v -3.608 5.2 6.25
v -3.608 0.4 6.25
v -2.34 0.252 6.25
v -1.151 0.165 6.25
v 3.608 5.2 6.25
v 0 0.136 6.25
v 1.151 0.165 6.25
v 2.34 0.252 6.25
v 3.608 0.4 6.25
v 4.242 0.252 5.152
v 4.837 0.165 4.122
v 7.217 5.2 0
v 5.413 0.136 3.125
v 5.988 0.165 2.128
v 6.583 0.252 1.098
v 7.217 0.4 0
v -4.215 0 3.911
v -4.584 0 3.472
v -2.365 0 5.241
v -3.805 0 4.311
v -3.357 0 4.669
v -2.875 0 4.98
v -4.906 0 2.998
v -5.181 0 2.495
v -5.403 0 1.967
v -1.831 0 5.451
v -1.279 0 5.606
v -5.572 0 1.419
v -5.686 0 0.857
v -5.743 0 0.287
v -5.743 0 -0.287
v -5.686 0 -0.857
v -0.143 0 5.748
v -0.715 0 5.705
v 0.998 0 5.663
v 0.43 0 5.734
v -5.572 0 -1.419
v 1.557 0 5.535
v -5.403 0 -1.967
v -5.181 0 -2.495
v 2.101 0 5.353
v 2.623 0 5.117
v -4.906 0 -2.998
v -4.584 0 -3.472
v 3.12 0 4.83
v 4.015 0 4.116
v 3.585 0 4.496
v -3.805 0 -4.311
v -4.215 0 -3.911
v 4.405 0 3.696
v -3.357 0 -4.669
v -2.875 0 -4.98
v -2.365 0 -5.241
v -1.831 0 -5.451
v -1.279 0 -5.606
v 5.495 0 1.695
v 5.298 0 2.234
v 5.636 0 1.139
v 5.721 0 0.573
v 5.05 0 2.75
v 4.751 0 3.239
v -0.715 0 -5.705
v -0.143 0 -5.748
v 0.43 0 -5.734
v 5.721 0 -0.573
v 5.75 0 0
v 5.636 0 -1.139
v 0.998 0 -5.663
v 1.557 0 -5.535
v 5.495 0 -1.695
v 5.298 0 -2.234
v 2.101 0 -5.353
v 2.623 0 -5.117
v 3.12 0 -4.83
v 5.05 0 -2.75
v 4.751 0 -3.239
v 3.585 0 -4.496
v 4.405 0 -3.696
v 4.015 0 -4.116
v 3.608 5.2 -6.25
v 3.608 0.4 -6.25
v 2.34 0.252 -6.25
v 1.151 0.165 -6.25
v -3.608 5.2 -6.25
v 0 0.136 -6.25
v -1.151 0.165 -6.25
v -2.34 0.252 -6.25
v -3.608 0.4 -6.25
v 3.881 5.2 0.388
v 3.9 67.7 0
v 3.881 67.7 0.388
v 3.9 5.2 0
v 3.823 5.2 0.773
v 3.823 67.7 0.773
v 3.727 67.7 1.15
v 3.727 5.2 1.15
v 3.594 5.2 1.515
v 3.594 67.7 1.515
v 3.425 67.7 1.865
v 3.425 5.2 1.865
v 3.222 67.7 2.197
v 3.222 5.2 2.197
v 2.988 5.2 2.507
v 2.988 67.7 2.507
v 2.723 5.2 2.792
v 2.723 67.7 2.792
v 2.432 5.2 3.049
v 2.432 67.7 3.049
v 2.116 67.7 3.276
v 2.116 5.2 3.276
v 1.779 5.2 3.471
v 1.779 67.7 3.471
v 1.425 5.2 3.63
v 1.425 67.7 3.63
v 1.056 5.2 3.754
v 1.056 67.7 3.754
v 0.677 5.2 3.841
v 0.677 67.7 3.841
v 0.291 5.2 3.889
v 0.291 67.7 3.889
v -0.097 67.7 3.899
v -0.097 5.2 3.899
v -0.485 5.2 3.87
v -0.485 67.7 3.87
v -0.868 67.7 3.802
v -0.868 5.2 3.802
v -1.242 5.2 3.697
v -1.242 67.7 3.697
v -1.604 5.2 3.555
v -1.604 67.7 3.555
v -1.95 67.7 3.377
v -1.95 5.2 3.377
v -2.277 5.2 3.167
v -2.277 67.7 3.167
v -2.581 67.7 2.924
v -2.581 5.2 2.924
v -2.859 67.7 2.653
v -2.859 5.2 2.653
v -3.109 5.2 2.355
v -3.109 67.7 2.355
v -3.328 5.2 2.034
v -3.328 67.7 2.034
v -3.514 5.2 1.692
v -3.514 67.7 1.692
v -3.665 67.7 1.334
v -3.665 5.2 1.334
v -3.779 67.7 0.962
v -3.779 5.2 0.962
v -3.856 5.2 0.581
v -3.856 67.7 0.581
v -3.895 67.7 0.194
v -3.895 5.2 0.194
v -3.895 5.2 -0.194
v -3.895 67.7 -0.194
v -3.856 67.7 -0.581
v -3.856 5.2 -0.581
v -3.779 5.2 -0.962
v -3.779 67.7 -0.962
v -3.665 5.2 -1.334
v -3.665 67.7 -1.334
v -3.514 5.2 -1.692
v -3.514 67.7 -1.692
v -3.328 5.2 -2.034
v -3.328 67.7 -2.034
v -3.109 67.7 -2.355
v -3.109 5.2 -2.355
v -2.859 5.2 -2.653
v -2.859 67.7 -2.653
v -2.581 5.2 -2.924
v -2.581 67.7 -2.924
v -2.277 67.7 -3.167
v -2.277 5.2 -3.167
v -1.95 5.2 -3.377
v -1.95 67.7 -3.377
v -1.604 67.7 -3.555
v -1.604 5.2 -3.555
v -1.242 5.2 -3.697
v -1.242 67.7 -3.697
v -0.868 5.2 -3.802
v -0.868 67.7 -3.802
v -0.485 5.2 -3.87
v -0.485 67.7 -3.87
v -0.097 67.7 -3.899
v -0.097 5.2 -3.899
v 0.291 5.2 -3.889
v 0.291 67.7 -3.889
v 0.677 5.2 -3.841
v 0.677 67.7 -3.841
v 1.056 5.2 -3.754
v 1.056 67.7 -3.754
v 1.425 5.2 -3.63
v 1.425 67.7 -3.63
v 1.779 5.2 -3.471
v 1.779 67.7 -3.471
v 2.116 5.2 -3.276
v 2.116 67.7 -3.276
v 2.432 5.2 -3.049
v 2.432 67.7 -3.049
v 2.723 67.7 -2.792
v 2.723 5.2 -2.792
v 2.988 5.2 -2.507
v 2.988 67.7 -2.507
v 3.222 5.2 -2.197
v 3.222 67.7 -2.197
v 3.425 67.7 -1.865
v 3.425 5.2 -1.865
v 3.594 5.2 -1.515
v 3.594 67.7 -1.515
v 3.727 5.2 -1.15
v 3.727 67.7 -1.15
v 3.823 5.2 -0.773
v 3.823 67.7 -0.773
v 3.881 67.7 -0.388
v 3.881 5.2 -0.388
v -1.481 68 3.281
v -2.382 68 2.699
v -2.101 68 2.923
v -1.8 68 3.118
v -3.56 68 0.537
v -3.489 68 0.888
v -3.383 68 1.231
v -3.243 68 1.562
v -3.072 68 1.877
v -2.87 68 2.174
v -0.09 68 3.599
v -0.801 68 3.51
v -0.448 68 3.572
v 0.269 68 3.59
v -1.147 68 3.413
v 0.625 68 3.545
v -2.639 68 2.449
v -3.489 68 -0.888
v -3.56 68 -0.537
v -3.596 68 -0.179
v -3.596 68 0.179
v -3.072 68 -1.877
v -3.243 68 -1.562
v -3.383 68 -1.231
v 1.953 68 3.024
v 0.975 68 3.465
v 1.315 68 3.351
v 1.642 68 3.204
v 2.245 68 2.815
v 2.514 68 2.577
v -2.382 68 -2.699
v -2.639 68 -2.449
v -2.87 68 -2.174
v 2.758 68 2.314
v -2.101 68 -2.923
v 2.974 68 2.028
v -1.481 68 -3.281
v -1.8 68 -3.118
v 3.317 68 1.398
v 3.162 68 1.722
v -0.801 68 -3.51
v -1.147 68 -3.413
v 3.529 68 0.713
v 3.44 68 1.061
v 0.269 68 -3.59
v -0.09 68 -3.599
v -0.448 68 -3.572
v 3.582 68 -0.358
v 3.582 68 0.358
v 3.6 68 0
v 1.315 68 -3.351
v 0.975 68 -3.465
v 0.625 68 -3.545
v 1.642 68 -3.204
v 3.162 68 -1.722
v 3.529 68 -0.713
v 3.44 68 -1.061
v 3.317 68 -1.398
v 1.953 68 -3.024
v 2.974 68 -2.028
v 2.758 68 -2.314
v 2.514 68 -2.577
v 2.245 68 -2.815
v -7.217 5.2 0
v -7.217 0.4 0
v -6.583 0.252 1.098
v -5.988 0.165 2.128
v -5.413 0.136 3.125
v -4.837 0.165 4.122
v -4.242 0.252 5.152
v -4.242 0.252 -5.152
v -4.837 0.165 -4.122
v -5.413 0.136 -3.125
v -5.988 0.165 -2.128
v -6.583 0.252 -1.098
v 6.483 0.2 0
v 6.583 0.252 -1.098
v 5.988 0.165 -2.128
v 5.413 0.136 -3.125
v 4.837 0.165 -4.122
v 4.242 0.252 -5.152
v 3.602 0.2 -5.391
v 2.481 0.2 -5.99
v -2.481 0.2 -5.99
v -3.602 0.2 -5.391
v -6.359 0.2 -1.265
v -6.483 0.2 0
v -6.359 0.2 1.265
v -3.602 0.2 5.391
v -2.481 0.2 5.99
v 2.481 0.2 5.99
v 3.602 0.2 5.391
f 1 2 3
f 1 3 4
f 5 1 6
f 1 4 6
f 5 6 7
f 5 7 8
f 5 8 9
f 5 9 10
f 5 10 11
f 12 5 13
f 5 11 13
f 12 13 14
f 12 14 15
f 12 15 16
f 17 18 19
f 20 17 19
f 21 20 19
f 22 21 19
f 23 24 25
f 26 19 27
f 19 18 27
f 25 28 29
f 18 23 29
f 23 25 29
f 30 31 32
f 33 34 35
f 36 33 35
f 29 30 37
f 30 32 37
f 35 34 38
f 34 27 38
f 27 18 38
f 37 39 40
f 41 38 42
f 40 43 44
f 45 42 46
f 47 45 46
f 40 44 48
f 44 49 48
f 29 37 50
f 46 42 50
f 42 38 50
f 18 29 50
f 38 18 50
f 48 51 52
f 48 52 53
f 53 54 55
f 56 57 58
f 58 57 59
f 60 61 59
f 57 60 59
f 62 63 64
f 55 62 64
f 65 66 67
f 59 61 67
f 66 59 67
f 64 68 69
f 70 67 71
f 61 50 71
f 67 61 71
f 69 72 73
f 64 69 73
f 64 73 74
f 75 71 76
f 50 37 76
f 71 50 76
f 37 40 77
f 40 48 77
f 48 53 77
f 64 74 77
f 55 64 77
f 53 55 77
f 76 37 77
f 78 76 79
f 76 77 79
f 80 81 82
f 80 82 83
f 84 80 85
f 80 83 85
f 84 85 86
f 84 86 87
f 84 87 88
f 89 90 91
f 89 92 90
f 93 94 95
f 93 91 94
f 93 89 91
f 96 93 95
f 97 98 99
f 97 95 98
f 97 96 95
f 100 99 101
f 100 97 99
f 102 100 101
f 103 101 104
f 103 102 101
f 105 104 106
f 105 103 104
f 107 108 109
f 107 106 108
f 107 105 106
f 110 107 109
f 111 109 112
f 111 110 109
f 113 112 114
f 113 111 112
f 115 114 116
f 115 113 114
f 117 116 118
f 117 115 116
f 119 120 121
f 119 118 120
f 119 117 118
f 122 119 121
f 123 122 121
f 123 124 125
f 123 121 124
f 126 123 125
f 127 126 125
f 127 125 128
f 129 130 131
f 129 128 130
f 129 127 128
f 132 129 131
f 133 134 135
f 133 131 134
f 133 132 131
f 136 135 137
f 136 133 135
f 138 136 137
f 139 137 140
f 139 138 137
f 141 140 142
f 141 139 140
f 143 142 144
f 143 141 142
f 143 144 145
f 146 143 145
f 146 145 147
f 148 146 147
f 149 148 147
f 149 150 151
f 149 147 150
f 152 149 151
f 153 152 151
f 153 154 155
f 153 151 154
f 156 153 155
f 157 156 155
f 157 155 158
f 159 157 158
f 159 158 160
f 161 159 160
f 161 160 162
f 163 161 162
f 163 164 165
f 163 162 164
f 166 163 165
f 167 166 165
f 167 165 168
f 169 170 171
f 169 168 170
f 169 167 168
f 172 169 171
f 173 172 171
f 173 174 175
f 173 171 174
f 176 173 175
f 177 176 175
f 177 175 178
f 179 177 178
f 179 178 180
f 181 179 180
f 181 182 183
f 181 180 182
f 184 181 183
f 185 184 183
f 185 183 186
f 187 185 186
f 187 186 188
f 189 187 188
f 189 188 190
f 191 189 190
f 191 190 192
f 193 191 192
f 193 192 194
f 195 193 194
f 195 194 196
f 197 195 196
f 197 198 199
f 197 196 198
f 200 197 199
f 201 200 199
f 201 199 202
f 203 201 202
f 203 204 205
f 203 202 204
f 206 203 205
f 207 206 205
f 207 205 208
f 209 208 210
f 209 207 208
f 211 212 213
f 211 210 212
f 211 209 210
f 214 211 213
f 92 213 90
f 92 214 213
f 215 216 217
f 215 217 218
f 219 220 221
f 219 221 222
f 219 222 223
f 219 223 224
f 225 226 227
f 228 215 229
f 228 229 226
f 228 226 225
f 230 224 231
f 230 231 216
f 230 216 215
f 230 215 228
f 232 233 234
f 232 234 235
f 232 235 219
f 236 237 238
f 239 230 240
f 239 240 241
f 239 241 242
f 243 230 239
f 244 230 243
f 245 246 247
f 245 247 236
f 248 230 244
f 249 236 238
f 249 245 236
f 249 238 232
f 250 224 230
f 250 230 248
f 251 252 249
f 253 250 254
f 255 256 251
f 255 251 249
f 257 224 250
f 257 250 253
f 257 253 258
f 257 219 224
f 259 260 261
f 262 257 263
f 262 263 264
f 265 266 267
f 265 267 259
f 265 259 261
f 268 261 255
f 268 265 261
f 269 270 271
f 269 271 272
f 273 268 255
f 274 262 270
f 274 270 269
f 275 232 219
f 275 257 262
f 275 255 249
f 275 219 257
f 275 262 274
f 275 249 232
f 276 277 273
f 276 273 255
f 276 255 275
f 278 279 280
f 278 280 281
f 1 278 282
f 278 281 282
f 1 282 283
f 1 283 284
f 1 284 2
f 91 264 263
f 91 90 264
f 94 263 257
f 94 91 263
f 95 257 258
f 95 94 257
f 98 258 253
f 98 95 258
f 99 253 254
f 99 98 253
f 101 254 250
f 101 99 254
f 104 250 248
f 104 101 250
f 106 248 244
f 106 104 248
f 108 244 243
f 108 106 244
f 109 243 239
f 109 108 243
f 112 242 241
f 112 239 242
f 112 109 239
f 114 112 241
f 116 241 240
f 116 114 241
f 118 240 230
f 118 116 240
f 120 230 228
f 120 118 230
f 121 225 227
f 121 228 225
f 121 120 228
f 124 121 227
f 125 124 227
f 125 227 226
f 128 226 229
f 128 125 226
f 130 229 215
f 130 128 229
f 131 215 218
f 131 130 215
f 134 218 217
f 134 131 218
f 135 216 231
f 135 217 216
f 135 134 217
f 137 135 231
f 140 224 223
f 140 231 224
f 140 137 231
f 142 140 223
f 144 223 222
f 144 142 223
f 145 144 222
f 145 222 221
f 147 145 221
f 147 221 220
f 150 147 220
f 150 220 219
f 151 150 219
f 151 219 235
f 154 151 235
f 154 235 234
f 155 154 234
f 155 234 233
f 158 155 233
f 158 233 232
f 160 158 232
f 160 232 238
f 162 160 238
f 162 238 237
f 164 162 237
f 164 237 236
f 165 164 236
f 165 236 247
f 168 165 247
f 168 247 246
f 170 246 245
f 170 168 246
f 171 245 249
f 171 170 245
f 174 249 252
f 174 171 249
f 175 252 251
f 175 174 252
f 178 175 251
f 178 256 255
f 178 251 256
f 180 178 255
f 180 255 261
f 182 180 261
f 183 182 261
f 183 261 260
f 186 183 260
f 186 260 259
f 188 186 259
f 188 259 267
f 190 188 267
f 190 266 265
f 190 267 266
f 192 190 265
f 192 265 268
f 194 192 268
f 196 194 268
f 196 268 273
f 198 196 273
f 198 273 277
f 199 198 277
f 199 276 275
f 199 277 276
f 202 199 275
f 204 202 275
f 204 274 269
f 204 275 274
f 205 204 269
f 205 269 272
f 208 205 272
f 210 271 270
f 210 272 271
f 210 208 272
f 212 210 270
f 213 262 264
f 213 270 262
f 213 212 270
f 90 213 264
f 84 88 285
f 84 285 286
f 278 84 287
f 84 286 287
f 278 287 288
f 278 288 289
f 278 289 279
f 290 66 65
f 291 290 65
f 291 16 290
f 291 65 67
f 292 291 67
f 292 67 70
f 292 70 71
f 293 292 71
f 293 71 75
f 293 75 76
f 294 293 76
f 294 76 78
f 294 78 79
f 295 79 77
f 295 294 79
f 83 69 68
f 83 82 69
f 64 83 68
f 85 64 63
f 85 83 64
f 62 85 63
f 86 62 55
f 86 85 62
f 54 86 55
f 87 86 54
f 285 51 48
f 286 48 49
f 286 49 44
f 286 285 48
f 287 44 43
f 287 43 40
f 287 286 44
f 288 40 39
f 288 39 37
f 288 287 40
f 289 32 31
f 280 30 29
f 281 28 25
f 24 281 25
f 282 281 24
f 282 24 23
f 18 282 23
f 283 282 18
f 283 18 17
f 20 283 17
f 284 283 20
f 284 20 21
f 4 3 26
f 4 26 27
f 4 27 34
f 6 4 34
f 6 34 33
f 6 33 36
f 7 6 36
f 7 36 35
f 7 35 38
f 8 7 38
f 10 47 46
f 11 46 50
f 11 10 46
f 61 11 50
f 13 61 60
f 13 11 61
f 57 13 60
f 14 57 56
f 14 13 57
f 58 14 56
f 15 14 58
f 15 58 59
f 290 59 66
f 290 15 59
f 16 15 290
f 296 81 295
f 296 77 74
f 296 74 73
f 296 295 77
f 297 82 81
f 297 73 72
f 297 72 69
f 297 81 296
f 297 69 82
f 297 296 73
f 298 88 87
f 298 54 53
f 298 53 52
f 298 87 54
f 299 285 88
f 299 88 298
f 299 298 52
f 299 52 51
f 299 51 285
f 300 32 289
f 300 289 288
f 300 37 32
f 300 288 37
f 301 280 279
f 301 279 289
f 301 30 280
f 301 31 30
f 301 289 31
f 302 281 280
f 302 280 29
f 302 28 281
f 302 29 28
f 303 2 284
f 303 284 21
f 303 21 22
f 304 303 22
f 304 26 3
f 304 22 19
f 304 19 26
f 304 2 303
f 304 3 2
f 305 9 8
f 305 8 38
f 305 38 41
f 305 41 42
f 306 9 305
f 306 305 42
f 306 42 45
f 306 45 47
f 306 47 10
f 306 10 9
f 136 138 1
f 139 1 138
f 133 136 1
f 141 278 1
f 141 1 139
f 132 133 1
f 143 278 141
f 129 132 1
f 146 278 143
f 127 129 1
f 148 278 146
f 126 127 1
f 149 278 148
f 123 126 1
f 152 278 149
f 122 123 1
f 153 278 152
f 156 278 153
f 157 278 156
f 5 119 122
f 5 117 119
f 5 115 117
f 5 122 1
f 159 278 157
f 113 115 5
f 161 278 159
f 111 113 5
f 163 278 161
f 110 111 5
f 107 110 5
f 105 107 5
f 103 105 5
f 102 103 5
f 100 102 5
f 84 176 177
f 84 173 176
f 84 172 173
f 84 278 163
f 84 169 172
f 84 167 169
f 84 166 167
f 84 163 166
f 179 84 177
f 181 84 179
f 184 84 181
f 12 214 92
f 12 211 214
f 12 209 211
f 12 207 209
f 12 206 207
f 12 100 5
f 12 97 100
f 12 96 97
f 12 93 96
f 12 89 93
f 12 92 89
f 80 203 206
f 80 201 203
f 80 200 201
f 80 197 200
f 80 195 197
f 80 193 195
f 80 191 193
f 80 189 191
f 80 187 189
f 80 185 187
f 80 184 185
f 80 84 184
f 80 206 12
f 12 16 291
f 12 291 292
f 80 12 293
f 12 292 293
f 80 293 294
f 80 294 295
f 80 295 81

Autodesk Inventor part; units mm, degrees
ref_plane "YZ Plane" through (0, 0, 0) normal (1, 0, 0) x (0, 1, 0)
ref_plane "XZ Plane" through (0, 0, 0) normal (0, 1, 0) x (-1, 0, 0)
ref_plane "XY Plane" through (0, 0, 0) normal (0, 0, 1) x (1, 0, 0)
sketch "Schizzo4" plane through (0, 0, 0) normal (0, 0, 1) x (1, 0, 0)
  line L0 (0, 0) -> (0, 68)
  line L1 (0, 68) -> (3.9, 68)
  line L2 (3.9, 68) -> (3.9, 5.2)
  line L3 (3.9, 5.2) -> (7.5, 5.2)
  line L4 (7.5, 5.2) -> (7.5, 0)
  line L5 (7.5, 0) -> (0, 0)
  dimension "d0" = 5.2
  dimension "d1" = 7.8
  dimension "d2" = 15
  dimension "d3" = 68
revolve "Rivoluzione1" add sketch "Schizzo4" angle 360 about axis through (0, 0, 0) along (0, 1, 0)
thread "Filettatura1" size "M8x1.25" class "6g" standard "ANSI Metric M Profile" length 62.5 offset 37
sketch "Schizzo5" plane through (0, 0, 0) normal (0, -1, 0) x (1, 0, 0)
  line L0 (-3.6084, -6.25) -> (-7.2169, 0)
  line L1 (-7.2169, 0) -> (-3.6084, 6.25)
  line L2 (-3.6084, 6.25) -> (3.6084, 6.25)
  line L3 (3.6084, 6.25) -> (7.2169, 0)
  line L4 (7.2169, 0) -> (3.6084, -6.25)
  line L5 (3.6084, -6.25) -> (-3.6084, -6.25)
  circle A0 centre (0, 0) radius 7.5 projected
  dimension "d9" = 12.5
extrude "Estrusione1" cut sketch "Schizzo5" against normal up to surface (5.2 mm away)
sketch "Schizzo6" plane through (0, 0, 0) normal (0, 0, 1) x (1, 0, 0)
  line L0 (3.9, 68) -> (-3.9, 68) projected
  line L1 (3.6, 68) -> (3.9, 67.7)
  line L2 (3.9, 5.2) -> (3.9, 68) projected
  line L3 (3.9, 68) -> (3.6, 68)
  line L4 (3.6084, 0) -> (7.2169, 0) projected
  line L5 (5.75, 0) -> (7.2169, 0.4)
  line L6 (7.2169, 0.4) -> (7.2169, 0)
  line L7 (7.2169, 0) -> (5.75, 0)
  line L8 (7.2169, 5.2) -> (3.6084, 5.2) projected
  line L9 (0, 0) -> (0, 68)
  dimension "d12" = 45
  dimension "d14" = 0.3
  dimension "d15" = 4.8
  dimension "d16" = 11.5
revolve "Rivoluzione3" cut sketch "Schizzo6" angle 360 about axis through (0, 0, 0) along (0, 1, 0)
properties part number "Bolt" material "Acciaio"
